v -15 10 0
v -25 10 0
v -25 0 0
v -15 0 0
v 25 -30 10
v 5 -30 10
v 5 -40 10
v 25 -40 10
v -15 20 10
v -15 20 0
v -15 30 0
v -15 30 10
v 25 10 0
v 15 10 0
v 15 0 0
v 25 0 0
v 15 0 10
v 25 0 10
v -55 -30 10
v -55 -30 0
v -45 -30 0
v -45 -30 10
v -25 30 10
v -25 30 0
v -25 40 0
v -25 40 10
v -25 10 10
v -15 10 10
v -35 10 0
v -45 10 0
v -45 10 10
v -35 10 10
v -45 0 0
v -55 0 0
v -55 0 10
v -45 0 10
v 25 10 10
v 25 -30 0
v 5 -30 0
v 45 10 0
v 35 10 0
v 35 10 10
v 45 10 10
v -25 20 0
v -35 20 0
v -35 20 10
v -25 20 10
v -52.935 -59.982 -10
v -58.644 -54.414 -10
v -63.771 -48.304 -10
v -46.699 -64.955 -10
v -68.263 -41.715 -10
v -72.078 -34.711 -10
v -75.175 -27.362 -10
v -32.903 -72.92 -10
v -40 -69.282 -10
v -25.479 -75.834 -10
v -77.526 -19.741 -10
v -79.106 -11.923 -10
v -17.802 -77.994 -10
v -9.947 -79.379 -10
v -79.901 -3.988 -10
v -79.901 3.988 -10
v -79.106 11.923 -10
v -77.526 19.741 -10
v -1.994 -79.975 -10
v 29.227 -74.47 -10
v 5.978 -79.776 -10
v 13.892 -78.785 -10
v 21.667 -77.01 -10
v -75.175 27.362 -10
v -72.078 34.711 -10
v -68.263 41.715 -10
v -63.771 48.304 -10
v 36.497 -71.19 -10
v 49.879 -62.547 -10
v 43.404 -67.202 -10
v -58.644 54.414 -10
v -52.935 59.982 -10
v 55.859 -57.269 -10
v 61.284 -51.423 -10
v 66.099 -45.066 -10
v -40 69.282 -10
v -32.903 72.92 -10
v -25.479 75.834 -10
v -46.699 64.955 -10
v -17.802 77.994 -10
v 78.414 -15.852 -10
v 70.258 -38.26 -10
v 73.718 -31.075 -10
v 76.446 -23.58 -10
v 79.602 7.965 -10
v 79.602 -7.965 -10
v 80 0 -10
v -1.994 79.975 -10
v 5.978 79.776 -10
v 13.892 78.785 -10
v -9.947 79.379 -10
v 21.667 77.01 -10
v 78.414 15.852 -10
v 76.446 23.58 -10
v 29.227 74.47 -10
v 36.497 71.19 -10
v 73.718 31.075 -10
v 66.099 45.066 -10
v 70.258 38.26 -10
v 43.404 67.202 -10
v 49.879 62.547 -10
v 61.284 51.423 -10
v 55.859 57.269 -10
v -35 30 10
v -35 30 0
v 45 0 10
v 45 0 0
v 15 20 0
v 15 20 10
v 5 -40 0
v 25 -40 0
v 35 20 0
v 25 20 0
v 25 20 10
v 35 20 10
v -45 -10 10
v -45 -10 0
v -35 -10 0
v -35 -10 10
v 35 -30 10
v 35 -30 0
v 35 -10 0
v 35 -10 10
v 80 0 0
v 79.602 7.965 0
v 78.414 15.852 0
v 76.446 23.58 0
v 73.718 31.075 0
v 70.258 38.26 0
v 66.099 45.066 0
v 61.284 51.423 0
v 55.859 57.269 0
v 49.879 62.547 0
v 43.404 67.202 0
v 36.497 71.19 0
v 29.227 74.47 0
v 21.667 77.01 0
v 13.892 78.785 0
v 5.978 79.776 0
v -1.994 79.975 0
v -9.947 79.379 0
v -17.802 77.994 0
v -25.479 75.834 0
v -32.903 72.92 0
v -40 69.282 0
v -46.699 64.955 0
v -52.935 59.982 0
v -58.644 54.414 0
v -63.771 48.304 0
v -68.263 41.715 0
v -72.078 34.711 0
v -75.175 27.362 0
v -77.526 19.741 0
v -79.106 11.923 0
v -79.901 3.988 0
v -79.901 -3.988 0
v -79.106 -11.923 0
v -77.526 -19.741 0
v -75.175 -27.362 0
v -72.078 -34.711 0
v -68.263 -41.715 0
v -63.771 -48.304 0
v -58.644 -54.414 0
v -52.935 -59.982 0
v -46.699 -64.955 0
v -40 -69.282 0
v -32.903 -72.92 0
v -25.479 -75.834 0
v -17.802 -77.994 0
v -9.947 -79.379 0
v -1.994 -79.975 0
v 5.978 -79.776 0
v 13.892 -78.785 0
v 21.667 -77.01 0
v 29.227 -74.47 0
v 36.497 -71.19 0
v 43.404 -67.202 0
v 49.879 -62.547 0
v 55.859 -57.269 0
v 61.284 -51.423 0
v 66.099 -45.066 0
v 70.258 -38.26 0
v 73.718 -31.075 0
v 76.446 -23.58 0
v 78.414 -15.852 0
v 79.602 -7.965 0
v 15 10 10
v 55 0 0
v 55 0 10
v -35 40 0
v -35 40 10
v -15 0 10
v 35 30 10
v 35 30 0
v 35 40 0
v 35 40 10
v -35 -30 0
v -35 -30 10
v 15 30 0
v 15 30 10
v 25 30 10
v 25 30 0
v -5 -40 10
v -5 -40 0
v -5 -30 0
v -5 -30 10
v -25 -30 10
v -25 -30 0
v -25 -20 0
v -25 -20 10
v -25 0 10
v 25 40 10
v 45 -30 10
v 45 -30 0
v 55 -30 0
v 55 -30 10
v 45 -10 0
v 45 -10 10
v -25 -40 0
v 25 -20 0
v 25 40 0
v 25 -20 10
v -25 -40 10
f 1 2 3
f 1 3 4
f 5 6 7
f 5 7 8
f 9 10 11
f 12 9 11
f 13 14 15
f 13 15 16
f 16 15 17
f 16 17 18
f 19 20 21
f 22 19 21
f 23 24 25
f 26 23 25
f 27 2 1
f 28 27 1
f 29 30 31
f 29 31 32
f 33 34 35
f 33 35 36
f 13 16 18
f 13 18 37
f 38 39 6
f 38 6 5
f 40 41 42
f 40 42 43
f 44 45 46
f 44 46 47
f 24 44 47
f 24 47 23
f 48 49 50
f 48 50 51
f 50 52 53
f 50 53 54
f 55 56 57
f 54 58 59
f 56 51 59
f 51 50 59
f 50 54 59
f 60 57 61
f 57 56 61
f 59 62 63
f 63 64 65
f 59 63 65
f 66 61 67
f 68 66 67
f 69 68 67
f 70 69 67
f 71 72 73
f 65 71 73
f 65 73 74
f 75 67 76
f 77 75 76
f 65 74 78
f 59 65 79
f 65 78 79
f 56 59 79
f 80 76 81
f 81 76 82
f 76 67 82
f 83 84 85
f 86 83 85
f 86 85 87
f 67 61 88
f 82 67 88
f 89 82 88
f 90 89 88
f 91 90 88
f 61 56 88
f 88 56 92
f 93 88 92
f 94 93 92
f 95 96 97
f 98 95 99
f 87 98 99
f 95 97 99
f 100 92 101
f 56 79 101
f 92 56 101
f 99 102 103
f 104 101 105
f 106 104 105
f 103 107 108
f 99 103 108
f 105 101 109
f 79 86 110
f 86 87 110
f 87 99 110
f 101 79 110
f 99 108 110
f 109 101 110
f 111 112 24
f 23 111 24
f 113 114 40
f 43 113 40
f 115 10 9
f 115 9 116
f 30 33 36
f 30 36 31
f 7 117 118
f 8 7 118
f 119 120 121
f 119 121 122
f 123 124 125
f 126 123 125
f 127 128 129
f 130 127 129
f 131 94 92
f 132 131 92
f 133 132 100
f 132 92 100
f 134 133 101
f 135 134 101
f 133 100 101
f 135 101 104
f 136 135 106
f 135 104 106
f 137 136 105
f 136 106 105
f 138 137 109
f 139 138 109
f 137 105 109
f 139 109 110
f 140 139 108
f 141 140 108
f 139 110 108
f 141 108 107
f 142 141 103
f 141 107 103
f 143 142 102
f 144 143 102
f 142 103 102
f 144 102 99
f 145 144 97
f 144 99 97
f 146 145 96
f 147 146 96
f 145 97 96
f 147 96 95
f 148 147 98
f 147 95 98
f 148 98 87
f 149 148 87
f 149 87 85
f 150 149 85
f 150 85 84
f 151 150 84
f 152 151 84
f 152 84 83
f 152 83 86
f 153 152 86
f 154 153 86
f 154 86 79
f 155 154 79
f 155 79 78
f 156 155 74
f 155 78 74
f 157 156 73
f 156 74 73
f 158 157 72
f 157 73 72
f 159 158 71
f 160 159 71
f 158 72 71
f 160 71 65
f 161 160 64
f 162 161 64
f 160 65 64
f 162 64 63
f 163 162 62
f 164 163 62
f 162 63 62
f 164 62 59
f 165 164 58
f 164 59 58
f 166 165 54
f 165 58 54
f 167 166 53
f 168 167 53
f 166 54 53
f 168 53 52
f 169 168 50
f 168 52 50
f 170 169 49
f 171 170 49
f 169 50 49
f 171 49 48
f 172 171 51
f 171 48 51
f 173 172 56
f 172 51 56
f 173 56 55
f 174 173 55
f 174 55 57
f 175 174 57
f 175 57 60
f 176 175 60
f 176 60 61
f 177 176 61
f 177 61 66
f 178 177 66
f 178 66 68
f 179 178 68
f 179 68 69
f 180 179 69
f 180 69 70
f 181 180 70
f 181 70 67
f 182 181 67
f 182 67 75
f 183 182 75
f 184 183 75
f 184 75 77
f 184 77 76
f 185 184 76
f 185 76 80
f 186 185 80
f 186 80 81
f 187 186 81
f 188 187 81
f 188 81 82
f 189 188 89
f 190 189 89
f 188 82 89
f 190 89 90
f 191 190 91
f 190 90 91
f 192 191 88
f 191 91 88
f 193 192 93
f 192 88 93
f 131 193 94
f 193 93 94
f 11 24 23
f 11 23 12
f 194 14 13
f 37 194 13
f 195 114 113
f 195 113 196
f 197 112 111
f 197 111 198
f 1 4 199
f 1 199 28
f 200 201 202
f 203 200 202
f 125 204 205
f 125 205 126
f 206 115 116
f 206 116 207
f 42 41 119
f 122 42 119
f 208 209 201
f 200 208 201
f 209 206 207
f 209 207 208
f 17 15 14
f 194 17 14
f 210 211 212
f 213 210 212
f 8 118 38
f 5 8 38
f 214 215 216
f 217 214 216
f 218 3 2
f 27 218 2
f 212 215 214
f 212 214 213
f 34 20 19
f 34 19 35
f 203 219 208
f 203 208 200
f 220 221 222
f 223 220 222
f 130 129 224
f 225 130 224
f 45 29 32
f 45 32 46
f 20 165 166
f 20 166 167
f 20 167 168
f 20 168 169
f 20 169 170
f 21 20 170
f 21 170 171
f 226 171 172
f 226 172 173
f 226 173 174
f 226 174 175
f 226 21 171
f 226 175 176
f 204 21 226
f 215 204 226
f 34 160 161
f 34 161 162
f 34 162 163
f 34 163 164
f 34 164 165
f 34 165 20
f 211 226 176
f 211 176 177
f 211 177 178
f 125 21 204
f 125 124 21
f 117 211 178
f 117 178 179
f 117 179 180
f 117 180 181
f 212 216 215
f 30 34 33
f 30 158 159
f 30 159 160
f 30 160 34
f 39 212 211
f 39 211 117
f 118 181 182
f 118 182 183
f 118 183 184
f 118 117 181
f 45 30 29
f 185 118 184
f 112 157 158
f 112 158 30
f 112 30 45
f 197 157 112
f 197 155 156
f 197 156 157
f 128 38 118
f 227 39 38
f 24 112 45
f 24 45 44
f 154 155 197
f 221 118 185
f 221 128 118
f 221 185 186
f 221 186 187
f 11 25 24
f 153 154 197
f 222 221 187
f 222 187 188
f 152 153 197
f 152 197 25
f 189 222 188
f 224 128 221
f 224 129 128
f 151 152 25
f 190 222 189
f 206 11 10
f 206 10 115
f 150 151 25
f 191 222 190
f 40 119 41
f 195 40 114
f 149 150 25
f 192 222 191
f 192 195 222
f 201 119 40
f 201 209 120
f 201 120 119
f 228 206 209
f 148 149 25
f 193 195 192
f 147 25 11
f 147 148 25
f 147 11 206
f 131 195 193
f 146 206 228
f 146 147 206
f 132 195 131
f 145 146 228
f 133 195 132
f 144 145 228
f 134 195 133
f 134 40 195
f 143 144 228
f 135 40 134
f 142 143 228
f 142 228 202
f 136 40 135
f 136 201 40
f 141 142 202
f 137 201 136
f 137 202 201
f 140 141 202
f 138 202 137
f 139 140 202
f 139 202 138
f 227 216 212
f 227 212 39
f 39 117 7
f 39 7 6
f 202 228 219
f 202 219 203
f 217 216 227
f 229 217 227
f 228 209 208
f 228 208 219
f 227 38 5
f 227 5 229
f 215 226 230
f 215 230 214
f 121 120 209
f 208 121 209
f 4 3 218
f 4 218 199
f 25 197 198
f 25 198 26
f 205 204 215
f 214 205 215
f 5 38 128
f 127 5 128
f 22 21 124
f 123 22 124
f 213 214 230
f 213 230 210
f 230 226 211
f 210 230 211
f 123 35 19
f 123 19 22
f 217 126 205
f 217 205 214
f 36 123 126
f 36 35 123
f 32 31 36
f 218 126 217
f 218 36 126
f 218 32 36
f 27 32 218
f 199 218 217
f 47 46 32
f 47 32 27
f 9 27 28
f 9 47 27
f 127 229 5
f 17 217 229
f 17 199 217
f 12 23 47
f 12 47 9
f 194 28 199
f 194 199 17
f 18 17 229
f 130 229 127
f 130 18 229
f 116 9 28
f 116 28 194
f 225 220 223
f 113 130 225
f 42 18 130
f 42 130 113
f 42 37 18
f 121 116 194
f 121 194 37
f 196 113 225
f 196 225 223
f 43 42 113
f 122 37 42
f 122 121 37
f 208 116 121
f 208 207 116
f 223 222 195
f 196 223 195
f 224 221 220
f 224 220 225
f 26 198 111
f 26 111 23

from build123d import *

# Parameters (mm, degrees)
CYLINDER_R     = 80
CYLINDER_DEPTH = 10
BOX005_W       = 10
BOX005_H       = 10
BOX005_DEPTH   = 10
BOX003_W       = 20
BOX003_H       = 10
BOX003_DEPTH   = 10
BOX010_W       = 70
BOX010_H       = 10
BOX010_DEPTH   = 10
BOX017_W       = 20
BOX017_H       = 10
BOX017_DEPTH   = 10
BOX001_W       = 10
BOX001_H       = 10
BOX001_DEPTH   = 10
BOX008_W       = 110
BOX008_H       = 10
BOX008_DEPTH   = 10
BOX009_W       = 10
BOX009_H       = 10
BOX009_DEPTH   = 10
BOX011_W       = 10
BOX011_H       = 10
BOX011_DEPTH   = 10
BOX016_W       = 20
BOX016_H       = 10
BOX016_DEPTH   = 10
BOX006_W       = 30
BOX006_H       = 10
BOX006_DEPTH   = 10
BOX013_W       = 10
BOX013_H       = 10
BOX013_DEPTH   = 10
BOX015_W       = 10
BOX015_H       = 10
BOX015_DEPTH   = 10
BOX007_W       = 20
BOX007_H       = 10
BOX007_DEPTH   = 10
BOX012_W       = 10
BOX012_H       = 10
BOX012_DEPTH   = 10
BOX002_W       = 70
BOX002_H       = 10
BOX002_DEPTH   = 10
BOX014_W       = 10
BOX014_H       = 10
BOX014_DEPTH   = 10
BOX004_W       = 10
BOX004_H       = 10
BOX004_DEPTH   = 10
BOX_W          = 10
BOX_H          = 10
BOX_DEPTH      = 10


with BuildPart() as cilindro:
    # Cylinder → Cylinder (new body)
    with BuildSketch(Plane.XY.offset(-10)):
        Circle(CYLINDER_R)
    extrude(amount=CYLINDER_DEPTH)


with BuildPart() as cubo005:
    # Box005 → Box005 (new body)
    with BuildSketch(Plane(origin=(50, -10, 0), x_dir=(1, 0, 0), z_dir=(0, 0, 1))):
        with Locations((5, 5)):
            Rectangle(BOX005_W, BOX005_H)
    extrude(amount=BOX005_DEPTH)


with BuildPart() as cubo003:
    # Box003 → Box003 (new body)
    with BuildSketch(Plane(origin=(-10, -30, 0), x_dir=(1, 0, 0), z_dir=(0, 0, 1))):
        with Locations((10, 5)):
            Rectangle(BOX003_W, BOX003_H)
    extrude(amount=BOX003_DEPTH)


with BuildPart() as cubo010:
    # Box010 → Box010 (new body)
    with BuildSketch(Plane(origin=(0, -50, 0), x_dir=(1, 0, 0), z_dir=(0, 0, 1))):
        with Locations((35, 5)):
            Rectangle(BOX010_W, BOX010_H)
    extrude(amount=BOX010_DEPTH)


with BuildPart() as cubo017:
    # Box017 → Box017 (new body)
    with BuildSketch(Plane(origin=(40, -70, 0), x_dir=(1, 0, 0), z_dir=(0, 0, 1))):
        with Locations((10, 5)):
            Rectangle(BOX017_W, BOX017_H)
    extrude(amount=BOX017_DEPTH)


with BuildPart() as cubo001:
    # Box001 → Box001 (new body)
    with BuildSketch(Plane(origin=(10, -10, 0), x_dir=(1, 0, 0), z_dir=(0, 0, 1))):
        with Locations((5, 5)):
            Rectangle(BOX001_W, BOX001_H)
    extrude(amount=BOX001_DEPTH)


with BuildPart() as cubo008:
    # Box008 → Box008 (new body)
    with BuildSketch(Plane(origin=(-20, -40, 0), x_dir=(1, 0, 0), z_dir=(0, 0, 1))):
        with Locations((55, 5)):
            Rectangle(BOX008_W, BOX008_H)
    extrude(amount=BOX008_DEPTH)


with BuildPart() as cubo009:
    # Box009 → Box009 (new body)
    with BuildSketch(Plane(origin=(-20, -50, 0), x_dir=(1, 0, 0), z_dir=(0, 0, 1))):
        with Locations((5, 5)):
            Rectangle(BOX009_W, BOX009_H)
    extrude(amount=BOX009_DEPTH)


with BuildPart() as cubo011:
    # Box011 → Box011 (new body)
    with BuildSketch(Plane(origin=(80, -50, 0), x_dir=(1, 0, 0), z_dir=(0, 0, 1))):
        with Locations((5, 5)):
            Rectangle(BOX011_W, BOX011_H)
    extrude(amount=BOX011_DEPTH)


with BuildPart() as cubo016:
    # Box016 → Box016 (new body)
    with BuildSketch(Plane(origin=(10, -70, 0), x_dir=(1, 0, 0), z_dir=(0, 0, 1))):
        with Locations((10, 5)):
            Rectangle(BOX016_W, BOX016_H)
    extrude(amount=BOX016_DEPTH)


with BuildPart() as cubo006:
    # Box006 → Box006 (new body)
    with BuildSketch(Plane(origin=(20, -30, 0), x_dir=(1, 0, 0), z_dir=(0, 0, 1))):
        with Locations((15, 5)):
            Rectangle(BOX006_W, BOX006_H)
    extrude(amount=BOX006_DEPTH)


with BuildPart() as cubo013:
    # Box013 → Box013 (new body)
    with BuildSketch(Plane(origin=(0, -60, 0), x_dir=(1, 0, 0), z_dir=(0, 0, 1))):
        with Locations((5, 5)):
            Rectangle(BOX013_W, BOX013_H)
    extrude(amount=BOX013_DEPTH)


with BuildPart() as cubo015:
    # Box015 → Box015 (new body)
    with BuildSketch(Plane(origin=(80, -60, 0), x_dir=(1, 0, 0), z_dir=(0, 0, 1))):
        with Locations((5, 5)):
            Rectangle(BOX015_W, BOX015_H)
    extrude(amount=BOX015_DEPTH)


with BuildPart() as cubo007:
    # Box007 → Box007 (new body)
    with BuildSketch(Plane(origin=(60, -30, 0), x_dir=(1, 0, 0), z_dir=(0, 0, 1))):
        with Locations((10, 5)):
            Rectangle(BOX007_W, BOX007_H)
    extrude(amount=BOX007_DEPTH)


with BuildPart() as cubo012:
    # Box012 → Box012 (new body)
    with BuildSketch(Plane(origin=(-20, -60, 0), x_dir=(1, 0, 0), z_dir=(0, 0, 1))):
        with Locations((5, 5)):
            Rectangle(BOX012_W, BOX012_H)
    extrude(amount=BOX012_DEPTH)


with BuildPart() as cubo002:
    # Box002 → Box002 (new body)
    with BuildSketch(Plane(origin=(0, -20, 0), x_dir=(1, 0, 0), z_dir=(0, 0, 1))):
        with Locations((35, 5)):
            Rectangle(BOX002_W, BOX002_H)
    extrude(amount=BOX002_DEPTH)


with BuildPart() as cubo014:
    # Box014 → Box014 (new body)
    with BuildSketch(Plane(origin=(60, -60, 0), x_dir=(1, 0, 0), z_dir=(0, 0, 1))):
        with Locations((5, 5)):
            Rectangle(BOX014_W, BOX014_H)
    extrude(amount=BOX014_DEPTH)


with BuildPart() as cubo004:
    # Box004 → Box004 (new body)
    with BuildSketch(Plane(origin=(60, 0, 0), x_dir=(1, 0, 0), z_dir=(0, 0, 1))):
        with Locations((5, 5)):
            Rectangle(BOX004_W, BOX004_H)
    extrude(amount=BOX004_DEPTH)


with BuildPart() as fusion001:
    # Box → Box (new body)
    with BuildSketch(Plane.XY):
        with Locations((5, 5)):
            Rectangle(BOX_W, BOX_H)
    extrude(amount=BOX_DEPTH)

    # Fusion: union Cubo005, Cubo003, Cubo010, Cubo017, Cubo001, Cubo008, Cubo009, Cubo011, Cubo016, Cubo006, Cubo013, Cubo015, Cubo007, Cubo012, Cubo002, Cubo014, Cubo004
    add(cubo005.part)
    add(cubo003.part)
    add(cubo010.part)
    add(cubo017.part)
    add(cubo001.part)
    add(cubo008.part)
    add(cubo009.part)
    add(cubo011.part)
    add(cubo016.part)
    add(cubo006.part)
    add(cubo013.part)
    add(cubo015.part)
    add(cubo007.part)
    add(cubo012.part)
    add(cubo002.part)
    add(cubo014.part)
    add(cubo004.part)


with BuildPart() as fusion001_1:
    # Fusion placement: moved
    add(fusion001.part.moved(Location((-35, 30, 0))))

    # Fusion001: union Cilindro
    add(cilindro.part)


solid = fusion001_1.part
